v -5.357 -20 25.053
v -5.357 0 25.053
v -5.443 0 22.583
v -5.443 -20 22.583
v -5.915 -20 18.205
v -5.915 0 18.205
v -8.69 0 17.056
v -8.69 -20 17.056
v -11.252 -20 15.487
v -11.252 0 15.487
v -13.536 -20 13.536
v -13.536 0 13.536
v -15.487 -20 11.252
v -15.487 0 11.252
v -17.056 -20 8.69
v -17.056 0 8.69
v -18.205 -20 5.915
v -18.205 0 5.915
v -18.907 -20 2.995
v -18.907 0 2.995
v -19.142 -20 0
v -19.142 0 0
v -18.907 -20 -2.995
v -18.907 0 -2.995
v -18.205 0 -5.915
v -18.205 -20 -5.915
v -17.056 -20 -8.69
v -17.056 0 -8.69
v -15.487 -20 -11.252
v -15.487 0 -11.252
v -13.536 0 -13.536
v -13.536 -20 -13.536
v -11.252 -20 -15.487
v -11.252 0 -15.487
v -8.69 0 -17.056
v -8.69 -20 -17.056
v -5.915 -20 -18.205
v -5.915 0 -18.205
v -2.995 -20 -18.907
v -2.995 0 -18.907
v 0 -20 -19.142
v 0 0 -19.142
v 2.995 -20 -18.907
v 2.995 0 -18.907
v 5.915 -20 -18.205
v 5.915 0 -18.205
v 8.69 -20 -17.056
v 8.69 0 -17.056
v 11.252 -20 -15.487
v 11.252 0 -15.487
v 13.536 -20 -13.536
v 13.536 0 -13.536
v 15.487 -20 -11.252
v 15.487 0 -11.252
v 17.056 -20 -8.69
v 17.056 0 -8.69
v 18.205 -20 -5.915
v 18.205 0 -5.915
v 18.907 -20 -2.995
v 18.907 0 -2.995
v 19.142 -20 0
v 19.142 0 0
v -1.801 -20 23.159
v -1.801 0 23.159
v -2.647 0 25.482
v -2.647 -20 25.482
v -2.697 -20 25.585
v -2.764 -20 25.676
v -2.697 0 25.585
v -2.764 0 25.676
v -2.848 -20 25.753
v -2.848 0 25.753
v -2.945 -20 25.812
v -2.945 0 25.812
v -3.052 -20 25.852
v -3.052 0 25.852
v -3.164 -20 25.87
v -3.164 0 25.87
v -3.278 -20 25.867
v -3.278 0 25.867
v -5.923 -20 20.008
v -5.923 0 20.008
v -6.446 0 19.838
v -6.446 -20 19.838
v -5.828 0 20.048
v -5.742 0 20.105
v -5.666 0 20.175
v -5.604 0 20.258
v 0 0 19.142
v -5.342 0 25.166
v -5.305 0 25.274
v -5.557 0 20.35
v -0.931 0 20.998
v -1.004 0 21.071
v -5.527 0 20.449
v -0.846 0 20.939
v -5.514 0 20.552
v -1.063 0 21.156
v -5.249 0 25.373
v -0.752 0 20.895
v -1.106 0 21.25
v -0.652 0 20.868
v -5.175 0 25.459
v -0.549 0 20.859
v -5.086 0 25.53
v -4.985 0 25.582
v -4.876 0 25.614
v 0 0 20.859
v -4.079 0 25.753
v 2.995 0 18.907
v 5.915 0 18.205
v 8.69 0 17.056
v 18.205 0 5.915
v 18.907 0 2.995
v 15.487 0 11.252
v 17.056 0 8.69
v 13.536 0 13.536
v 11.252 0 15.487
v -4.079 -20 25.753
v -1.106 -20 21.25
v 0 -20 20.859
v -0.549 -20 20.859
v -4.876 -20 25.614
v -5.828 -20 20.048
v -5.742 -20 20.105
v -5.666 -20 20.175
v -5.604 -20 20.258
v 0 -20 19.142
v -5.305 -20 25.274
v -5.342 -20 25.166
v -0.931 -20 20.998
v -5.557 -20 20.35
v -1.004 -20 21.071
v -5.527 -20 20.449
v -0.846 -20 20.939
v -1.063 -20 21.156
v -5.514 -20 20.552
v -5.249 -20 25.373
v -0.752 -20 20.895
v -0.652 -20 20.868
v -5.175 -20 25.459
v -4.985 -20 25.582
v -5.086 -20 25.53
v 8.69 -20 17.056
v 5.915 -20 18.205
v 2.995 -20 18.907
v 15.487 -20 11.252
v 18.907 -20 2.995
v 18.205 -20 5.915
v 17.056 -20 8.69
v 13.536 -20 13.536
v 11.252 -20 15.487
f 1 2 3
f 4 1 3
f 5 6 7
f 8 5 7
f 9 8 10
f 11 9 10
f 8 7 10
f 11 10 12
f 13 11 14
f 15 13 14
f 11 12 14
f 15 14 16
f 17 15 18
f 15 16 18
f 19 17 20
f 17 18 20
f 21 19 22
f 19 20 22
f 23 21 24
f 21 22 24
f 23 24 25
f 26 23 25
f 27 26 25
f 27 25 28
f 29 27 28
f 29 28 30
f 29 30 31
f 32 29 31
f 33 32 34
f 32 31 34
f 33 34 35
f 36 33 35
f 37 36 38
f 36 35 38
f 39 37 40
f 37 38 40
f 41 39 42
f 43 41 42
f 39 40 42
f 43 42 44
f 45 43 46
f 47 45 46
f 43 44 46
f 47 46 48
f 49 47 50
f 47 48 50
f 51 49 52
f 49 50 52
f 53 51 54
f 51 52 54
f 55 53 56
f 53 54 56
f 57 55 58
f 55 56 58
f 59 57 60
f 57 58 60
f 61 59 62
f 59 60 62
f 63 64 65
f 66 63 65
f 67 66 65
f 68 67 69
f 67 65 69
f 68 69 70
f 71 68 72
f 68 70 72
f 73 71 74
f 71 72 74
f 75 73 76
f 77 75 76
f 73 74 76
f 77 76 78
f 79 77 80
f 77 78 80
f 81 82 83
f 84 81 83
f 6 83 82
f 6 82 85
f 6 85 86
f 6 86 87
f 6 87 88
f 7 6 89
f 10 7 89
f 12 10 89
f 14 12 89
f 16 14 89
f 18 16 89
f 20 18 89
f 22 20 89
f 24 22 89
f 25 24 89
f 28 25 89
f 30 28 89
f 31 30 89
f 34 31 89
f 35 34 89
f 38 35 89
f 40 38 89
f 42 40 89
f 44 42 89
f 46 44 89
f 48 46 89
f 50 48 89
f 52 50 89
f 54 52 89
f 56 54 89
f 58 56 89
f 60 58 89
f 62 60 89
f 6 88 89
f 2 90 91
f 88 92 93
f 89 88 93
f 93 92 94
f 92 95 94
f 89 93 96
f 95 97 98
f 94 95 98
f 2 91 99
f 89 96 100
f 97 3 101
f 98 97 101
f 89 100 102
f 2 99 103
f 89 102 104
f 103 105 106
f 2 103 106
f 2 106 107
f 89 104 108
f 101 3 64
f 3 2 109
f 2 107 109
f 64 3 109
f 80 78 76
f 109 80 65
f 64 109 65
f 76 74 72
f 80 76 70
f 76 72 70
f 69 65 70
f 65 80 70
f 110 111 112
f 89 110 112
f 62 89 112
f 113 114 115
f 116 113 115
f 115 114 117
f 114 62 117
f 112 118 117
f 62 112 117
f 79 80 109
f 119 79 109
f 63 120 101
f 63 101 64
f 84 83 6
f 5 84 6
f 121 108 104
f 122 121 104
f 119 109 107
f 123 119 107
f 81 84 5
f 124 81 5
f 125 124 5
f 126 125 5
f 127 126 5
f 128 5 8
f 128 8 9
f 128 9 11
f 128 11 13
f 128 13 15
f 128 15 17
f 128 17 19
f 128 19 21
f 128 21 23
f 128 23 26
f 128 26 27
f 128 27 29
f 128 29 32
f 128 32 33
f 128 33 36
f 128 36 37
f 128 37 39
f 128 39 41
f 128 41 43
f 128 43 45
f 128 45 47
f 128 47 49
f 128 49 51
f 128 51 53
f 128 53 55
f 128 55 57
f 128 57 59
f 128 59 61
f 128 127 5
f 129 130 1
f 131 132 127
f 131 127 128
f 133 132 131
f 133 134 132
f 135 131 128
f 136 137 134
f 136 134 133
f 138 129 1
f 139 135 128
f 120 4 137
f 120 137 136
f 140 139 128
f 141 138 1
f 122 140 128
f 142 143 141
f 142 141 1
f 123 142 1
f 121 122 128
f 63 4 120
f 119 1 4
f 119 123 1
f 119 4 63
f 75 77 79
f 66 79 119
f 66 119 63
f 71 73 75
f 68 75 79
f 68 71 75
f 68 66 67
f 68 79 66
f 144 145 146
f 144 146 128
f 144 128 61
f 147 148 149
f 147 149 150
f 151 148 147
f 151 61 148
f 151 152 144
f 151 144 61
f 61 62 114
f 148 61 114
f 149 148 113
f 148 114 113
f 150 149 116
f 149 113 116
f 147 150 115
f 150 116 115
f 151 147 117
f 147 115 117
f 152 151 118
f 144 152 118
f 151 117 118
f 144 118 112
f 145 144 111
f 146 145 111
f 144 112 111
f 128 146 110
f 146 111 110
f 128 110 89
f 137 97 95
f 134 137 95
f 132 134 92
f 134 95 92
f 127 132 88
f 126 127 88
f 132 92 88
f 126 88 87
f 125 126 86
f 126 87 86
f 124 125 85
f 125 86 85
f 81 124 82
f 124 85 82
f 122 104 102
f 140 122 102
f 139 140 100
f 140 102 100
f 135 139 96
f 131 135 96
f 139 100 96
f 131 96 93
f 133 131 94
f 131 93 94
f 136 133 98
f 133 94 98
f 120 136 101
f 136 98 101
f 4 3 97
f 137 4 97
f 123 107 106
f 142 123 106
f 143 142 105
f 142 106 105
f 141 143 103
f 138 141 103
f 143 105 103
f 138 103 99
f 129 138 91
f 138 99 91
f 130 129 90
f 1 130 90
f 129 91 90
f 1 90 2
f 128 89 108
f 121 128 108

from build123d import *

# Parameters (mm, degrees)
F1_DEPTH = 20


with BuildPart() as f1:
    # F0 (on Front) → F1 (new body)
    with BuildSketch(Plane.XZ):
        with BuildLine():
            ThreePointArc((-2.99453, 18.906719), (-4.468703, 18.613488), (-5.915325, 18.205498))
            ThreePointArc((-5.915325, 18.205498), (-11.251617, -15.486522), (19.142393, 0))
            ThreePointArc((19.142393, 0), (13.535716, 13.535716), (0, 19.142393))
            ThreePointArc((0, 19.142393), (-1.501895, 19.083384), (-2.99453, 18.906719))
        make_face()
        with BuildLine():
            Line((-6.445802, 19.838138), (-5.915325, 18.205498))
            ThreePointArc((-5.915325, 18.205498), (-4.468703, 18.613488), (-2.99453, 18.906719))
            Line((-2.99453, 18.906719), (-4.078854, 25.752868))
            Line((-4.078854, 25.752868), (-4.875689, 25.613901))
            ThreePointArc((-4.875689, 25.613901), (-5.214191, 25.41757), (-5.356509, 25.053049))
            Line((-5.356509, 25.053049), (-5.443327, 22.582582))
            Line((-5.443327, 22.582582), (-5.5143, 20.551845))
            ThreePointArc((-5.5143, 20.551845), (-5.633033, 20.215337), (-5.923472, 20.00802))
            Line((-5.923472, 20.00802), (-6.445802, 19.838138))
        make_face()
        with BuildLine():
            Line((-4.078854, 25.752868), (-2.99453, 18.906719))
            ThreePointArc((-2.99453, 18.906719), (-1.501895, 19.083384), (0, 19.142393))
            Line((0, 19.142393), (0, 20.859053))
            Line((0, 20.859053), (-0.549261, 20.859211))
            ThreePointArc((-0.549261, 20.859211), (-0.88955, 20.966631), (-1.106458, 21.249979))
            Line((-1.106458, 21.249979), (-1.80149, 23.159393))
            Line((-1.80149, 23.159393), (-2.647475, 25.482118))
            ThreePointArc((-2.647475, 25.482118), (-2.895471, 25.784819), (-3.278075, 25.866939))
            Line((-3.278075, 25.866939), (-4.078854, 25.752868))
        make_face()
    extrude(amount=F1_DEPTH)


solid = f1.part
